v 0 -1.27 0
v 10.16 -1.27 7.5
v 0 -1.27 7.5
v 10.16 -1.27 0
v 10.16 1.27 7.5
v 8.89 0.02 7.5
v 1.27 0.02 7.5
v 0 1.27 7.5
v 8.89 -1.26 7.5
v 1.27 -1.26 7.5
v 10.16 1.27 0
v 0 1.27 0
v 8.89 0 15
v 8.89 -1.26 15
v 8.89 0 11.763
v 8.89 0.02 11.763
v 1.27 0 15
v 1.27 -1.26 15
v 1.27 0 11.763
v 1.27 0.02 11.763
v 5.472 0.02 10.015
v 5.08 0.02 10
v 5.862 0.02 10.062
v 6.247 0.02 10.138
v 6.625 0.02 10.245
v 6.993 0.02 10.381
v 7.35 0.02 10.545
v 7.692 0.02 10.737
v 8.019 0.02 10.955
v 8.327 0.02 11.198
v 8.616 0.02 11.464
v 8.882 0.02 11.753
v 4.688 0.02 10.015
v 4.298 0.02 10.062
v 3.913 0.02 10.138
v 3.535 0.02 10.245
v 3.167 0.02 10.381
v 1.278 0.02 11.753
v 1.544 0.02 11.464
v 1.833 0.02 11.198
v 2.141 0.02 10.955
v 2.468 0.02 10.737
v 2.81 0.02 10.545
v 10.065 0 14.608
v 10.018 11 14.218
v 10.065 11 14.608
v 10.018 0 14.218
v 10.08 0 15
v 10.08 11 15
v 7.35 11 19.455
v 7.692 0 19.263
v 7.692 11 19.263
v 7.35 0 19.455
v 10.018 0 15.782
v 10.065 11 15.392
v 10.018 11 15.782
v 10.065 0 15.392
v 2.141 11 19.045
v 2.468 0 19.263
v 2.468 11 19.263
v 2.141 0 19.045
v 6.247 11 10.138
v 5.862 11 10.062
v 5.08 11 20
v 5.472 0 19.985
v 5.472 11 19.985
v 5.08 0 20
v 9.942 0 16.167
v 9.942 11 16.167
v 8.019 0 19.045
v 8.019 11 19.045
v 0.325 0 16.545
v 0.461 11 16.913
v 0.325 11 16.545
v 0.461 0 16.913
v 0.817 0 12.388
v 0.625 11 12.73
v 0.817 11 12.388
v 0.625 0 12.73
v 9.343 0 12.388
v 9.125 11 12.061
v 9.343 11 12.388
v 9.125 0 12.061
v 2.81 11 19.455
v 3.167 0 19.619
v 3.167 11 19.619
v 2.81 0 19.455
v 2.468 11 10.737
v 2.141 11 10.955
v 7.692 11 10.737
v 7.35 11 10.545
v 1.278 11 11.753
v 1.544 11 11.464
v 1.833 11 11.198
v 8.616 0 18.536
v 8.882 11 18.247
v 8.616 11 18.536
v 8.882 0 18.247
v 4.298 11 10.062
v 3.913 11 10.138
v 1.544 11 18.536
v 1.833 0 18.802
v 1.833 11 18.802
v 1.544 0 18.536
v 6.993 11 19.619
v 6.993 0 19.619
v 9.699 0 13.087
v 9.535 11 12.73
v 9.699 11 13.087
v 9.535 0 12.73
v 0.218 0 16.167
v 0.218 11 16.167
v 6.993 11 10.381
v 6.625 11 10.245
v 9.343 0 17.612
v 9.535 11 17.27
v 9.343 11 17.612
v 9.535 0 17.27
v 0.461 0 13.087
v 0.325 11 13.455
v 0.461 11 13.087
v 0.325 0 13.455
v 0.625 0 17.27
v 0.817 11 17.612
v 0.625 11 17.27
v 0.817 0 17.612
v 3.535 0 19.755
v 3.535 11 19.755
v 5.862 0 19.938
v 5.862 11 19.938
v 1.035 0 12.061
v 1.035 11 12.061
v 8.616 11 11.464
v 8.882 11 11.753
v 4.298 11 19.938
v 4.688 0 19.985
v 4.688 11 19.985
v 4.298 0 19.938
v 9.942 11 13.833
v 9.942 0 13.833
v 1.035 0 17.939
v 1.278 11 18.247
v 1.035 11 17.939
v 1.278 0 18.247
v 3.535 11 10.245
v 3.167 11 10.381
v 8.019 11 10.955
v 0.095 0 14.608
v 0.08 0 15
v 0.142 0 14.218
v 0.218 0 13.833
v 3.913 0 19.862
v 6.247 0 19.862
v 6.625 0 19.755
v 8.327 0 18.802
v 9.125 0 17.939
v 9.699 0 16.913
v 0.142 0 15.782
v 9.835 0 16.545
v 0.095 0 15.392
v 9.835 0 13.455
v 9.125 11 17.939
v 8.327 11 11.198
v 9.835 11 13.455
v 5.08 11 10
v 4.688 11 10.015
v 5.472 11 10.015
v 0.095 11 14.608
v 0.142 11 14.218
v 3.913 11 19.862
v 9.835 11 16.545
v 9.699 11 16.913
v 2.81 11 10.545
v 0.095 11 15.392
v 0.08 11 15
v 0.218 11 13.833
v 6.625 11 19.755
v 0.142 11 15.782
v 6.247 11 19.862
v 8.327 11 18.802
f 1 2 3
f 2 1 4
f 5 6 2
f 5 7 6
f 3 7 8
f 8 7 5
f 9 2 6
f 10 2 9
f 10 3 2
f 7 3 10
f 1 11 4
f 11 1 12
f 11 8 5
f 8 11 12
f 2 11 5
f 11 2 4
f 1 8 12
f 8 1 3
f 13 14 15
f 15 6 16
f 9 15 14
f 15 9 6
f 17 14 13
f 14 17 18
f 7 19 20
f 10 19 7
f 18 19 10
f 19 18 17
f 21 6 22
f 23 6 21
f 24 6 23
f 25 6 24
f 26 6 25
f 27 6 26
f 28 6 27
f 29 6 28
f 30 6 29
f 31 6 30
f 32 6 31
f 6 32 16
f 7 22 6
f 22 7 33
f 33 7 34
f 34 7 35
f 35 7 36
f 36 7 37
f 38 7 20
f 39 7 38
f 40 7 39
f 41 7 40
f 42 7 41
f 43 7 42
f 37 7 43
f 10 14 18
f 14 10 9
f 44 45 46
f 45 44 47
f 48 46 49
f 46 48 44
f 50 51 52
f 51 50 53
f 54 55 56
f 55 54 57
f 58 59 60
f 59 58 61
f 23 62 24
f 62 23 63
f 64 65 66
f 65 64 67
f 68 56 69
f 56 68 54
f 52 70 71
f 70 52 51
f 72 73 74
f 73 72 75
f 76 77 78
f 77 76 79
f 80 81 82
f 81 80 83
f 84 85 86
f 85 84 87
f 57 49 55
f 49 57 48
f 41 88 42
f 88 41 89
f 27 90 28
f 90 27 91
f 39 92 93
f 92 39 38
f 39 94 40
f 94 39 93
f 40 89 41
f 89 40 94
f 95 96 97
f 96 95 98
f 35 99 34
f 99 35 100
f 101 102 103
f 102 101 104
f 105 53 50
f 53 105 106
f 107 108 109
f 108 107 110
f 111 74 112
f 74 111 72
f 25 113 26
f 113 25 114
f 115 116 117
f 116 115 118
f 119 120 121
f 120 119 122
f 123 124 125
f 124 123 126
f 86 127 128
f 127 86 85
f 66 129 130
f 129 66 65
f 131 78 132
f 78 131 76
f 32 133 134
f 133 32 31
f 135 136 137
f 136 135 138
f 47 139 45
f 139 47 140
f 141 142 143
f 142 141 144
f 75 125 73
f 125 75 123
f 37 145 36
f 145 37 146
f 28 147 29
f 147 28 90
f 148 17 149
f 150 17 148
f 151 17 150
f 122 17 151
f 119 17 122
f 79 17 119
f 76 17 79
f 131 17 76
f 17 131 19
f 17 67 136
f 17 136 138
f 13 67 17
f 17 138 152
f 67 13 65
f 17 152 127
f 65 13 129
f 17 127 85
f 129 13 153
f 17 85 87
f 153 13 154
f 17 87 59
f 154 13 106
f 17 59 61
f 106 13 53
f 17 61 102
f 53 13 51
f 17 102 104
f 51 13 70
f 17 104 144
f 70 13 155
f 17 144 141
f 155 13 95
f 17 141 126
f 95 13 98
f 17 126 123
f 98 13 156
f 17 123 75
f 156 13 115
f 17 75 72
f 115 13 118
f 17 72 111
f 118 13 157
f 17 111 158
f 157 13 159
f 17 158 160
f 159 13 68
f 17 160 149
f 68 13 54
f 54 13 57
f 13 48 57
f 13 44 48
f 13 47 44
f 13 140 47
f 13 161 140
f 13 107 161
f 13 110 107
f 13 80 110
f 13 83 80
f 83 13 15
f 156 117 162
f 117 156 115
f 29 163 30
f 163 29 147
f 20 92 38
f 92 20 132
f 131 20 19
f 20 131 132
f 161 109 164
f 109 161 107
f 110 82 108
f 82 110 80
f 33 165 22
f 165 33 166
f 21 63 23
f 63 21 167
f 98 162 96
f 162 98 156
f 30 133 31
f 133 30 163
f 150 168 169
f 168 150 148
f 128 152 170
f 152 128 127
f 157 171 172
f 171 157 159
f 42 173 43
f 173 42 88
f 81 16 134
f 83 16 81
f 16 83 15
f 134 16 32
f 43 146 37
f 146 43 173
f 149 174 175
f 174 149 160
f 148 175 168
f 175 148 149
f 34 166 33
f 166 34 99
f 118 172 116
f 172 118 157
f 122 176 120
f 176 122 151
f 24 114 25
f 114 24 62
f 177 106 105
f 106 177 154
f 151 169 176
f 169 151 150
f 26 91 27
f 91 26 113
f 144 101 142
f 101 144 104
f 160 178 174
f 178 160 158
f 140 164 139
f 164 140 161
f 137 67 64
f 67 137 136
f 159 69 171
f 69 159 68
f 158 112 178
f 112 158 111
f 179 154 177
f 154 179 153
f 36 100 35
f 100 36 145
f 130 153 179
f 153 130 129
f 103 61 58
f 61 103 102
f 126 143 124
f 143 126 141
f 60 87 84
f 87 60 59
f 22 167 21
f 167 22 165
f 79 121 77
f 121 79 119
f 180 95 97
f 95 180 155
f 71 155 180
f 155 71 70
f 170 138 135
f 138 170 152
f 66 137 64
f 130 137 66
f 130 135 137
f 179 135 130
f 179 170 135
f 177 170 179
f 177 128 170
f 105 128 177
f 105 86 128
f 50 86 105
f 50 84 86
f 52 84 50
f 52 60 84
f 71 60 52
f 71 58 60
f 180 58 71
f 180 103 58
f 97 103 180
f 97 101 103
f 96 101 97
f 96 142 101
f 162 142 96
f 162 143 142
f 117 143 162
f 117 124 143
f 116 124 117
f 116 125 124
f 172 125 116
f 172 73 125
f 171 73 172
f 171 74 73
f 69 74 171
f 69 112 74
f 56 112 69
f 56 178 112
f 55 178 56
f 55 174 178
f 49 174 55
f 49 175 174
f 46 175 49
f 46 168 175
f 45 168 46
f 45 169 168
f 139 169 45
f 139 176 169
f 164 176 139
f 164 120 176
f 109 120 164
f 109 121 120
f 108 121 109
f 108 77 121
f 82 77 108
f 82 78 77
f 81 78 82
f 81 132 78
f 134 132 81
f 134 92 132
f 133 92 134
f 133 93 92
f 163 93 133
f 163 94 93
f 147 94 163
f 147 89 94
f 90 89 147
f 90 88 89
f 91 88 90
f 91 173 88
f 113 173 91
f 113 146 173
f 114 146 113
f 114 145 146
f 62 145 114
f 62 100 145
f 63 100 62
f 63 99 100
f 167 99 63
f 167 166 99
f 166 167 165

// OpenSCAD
// file: pins.scad
module pinsocket(count, RM=2.54)
{
    // Component-specific parameters
    socket_color = "black";
    socket_z = 7.5;

    pin_color = "lightgray";
    pin_radius = RM/4;
    pin_z = 2;


    // Solder pin
    // color(pin_color)
    // translate([RM/2, RM/2, -pin_z])
    // cylinder(
    //         r = pin_radius,
    //         h = pin_z + nothing
    //     );

    // Socket
    color(socket_color)
    translate([-RM/2, 0, 0])
    cube([RM, count*RM, socket_z]);
}


module pins(count, RM=2.54)
{
    pinsocket(count, RM);

    // TODO...
}
// file: config.scad
// Rendering: Level of detail
$fn = 80;

// Quickfix for rendering artifacts on overlaps
nothing = 0.01;

adapter_size_x = 26;
adapter_size_y = 29;

sensor_pcb_size_x = 20;
sensor_pcb_size_y = 20;
// main file
include <config.scad>;
use <pins.scad>;


module led_socket()
{
    RM = 2.54;

    led_color = "red";
    led_r = 5;
    led_h = 11;
    led_x = 2.0 * RM;
    led_z = 15.0;

    rotate([0, 0, -90])
    pinsocket(count=4, RM=2.54);

    translate([RM/2, -RM/2+nothing, 0])
    cube([3*RM, RM/2+nothing, led_z]);

    color(led_color)
    translate([led_x, 0, led_z])
    rotate([-90, 0, 0])
    cylinder(
            r = led_r,
            h = led_h
        );
}

led_socket();
